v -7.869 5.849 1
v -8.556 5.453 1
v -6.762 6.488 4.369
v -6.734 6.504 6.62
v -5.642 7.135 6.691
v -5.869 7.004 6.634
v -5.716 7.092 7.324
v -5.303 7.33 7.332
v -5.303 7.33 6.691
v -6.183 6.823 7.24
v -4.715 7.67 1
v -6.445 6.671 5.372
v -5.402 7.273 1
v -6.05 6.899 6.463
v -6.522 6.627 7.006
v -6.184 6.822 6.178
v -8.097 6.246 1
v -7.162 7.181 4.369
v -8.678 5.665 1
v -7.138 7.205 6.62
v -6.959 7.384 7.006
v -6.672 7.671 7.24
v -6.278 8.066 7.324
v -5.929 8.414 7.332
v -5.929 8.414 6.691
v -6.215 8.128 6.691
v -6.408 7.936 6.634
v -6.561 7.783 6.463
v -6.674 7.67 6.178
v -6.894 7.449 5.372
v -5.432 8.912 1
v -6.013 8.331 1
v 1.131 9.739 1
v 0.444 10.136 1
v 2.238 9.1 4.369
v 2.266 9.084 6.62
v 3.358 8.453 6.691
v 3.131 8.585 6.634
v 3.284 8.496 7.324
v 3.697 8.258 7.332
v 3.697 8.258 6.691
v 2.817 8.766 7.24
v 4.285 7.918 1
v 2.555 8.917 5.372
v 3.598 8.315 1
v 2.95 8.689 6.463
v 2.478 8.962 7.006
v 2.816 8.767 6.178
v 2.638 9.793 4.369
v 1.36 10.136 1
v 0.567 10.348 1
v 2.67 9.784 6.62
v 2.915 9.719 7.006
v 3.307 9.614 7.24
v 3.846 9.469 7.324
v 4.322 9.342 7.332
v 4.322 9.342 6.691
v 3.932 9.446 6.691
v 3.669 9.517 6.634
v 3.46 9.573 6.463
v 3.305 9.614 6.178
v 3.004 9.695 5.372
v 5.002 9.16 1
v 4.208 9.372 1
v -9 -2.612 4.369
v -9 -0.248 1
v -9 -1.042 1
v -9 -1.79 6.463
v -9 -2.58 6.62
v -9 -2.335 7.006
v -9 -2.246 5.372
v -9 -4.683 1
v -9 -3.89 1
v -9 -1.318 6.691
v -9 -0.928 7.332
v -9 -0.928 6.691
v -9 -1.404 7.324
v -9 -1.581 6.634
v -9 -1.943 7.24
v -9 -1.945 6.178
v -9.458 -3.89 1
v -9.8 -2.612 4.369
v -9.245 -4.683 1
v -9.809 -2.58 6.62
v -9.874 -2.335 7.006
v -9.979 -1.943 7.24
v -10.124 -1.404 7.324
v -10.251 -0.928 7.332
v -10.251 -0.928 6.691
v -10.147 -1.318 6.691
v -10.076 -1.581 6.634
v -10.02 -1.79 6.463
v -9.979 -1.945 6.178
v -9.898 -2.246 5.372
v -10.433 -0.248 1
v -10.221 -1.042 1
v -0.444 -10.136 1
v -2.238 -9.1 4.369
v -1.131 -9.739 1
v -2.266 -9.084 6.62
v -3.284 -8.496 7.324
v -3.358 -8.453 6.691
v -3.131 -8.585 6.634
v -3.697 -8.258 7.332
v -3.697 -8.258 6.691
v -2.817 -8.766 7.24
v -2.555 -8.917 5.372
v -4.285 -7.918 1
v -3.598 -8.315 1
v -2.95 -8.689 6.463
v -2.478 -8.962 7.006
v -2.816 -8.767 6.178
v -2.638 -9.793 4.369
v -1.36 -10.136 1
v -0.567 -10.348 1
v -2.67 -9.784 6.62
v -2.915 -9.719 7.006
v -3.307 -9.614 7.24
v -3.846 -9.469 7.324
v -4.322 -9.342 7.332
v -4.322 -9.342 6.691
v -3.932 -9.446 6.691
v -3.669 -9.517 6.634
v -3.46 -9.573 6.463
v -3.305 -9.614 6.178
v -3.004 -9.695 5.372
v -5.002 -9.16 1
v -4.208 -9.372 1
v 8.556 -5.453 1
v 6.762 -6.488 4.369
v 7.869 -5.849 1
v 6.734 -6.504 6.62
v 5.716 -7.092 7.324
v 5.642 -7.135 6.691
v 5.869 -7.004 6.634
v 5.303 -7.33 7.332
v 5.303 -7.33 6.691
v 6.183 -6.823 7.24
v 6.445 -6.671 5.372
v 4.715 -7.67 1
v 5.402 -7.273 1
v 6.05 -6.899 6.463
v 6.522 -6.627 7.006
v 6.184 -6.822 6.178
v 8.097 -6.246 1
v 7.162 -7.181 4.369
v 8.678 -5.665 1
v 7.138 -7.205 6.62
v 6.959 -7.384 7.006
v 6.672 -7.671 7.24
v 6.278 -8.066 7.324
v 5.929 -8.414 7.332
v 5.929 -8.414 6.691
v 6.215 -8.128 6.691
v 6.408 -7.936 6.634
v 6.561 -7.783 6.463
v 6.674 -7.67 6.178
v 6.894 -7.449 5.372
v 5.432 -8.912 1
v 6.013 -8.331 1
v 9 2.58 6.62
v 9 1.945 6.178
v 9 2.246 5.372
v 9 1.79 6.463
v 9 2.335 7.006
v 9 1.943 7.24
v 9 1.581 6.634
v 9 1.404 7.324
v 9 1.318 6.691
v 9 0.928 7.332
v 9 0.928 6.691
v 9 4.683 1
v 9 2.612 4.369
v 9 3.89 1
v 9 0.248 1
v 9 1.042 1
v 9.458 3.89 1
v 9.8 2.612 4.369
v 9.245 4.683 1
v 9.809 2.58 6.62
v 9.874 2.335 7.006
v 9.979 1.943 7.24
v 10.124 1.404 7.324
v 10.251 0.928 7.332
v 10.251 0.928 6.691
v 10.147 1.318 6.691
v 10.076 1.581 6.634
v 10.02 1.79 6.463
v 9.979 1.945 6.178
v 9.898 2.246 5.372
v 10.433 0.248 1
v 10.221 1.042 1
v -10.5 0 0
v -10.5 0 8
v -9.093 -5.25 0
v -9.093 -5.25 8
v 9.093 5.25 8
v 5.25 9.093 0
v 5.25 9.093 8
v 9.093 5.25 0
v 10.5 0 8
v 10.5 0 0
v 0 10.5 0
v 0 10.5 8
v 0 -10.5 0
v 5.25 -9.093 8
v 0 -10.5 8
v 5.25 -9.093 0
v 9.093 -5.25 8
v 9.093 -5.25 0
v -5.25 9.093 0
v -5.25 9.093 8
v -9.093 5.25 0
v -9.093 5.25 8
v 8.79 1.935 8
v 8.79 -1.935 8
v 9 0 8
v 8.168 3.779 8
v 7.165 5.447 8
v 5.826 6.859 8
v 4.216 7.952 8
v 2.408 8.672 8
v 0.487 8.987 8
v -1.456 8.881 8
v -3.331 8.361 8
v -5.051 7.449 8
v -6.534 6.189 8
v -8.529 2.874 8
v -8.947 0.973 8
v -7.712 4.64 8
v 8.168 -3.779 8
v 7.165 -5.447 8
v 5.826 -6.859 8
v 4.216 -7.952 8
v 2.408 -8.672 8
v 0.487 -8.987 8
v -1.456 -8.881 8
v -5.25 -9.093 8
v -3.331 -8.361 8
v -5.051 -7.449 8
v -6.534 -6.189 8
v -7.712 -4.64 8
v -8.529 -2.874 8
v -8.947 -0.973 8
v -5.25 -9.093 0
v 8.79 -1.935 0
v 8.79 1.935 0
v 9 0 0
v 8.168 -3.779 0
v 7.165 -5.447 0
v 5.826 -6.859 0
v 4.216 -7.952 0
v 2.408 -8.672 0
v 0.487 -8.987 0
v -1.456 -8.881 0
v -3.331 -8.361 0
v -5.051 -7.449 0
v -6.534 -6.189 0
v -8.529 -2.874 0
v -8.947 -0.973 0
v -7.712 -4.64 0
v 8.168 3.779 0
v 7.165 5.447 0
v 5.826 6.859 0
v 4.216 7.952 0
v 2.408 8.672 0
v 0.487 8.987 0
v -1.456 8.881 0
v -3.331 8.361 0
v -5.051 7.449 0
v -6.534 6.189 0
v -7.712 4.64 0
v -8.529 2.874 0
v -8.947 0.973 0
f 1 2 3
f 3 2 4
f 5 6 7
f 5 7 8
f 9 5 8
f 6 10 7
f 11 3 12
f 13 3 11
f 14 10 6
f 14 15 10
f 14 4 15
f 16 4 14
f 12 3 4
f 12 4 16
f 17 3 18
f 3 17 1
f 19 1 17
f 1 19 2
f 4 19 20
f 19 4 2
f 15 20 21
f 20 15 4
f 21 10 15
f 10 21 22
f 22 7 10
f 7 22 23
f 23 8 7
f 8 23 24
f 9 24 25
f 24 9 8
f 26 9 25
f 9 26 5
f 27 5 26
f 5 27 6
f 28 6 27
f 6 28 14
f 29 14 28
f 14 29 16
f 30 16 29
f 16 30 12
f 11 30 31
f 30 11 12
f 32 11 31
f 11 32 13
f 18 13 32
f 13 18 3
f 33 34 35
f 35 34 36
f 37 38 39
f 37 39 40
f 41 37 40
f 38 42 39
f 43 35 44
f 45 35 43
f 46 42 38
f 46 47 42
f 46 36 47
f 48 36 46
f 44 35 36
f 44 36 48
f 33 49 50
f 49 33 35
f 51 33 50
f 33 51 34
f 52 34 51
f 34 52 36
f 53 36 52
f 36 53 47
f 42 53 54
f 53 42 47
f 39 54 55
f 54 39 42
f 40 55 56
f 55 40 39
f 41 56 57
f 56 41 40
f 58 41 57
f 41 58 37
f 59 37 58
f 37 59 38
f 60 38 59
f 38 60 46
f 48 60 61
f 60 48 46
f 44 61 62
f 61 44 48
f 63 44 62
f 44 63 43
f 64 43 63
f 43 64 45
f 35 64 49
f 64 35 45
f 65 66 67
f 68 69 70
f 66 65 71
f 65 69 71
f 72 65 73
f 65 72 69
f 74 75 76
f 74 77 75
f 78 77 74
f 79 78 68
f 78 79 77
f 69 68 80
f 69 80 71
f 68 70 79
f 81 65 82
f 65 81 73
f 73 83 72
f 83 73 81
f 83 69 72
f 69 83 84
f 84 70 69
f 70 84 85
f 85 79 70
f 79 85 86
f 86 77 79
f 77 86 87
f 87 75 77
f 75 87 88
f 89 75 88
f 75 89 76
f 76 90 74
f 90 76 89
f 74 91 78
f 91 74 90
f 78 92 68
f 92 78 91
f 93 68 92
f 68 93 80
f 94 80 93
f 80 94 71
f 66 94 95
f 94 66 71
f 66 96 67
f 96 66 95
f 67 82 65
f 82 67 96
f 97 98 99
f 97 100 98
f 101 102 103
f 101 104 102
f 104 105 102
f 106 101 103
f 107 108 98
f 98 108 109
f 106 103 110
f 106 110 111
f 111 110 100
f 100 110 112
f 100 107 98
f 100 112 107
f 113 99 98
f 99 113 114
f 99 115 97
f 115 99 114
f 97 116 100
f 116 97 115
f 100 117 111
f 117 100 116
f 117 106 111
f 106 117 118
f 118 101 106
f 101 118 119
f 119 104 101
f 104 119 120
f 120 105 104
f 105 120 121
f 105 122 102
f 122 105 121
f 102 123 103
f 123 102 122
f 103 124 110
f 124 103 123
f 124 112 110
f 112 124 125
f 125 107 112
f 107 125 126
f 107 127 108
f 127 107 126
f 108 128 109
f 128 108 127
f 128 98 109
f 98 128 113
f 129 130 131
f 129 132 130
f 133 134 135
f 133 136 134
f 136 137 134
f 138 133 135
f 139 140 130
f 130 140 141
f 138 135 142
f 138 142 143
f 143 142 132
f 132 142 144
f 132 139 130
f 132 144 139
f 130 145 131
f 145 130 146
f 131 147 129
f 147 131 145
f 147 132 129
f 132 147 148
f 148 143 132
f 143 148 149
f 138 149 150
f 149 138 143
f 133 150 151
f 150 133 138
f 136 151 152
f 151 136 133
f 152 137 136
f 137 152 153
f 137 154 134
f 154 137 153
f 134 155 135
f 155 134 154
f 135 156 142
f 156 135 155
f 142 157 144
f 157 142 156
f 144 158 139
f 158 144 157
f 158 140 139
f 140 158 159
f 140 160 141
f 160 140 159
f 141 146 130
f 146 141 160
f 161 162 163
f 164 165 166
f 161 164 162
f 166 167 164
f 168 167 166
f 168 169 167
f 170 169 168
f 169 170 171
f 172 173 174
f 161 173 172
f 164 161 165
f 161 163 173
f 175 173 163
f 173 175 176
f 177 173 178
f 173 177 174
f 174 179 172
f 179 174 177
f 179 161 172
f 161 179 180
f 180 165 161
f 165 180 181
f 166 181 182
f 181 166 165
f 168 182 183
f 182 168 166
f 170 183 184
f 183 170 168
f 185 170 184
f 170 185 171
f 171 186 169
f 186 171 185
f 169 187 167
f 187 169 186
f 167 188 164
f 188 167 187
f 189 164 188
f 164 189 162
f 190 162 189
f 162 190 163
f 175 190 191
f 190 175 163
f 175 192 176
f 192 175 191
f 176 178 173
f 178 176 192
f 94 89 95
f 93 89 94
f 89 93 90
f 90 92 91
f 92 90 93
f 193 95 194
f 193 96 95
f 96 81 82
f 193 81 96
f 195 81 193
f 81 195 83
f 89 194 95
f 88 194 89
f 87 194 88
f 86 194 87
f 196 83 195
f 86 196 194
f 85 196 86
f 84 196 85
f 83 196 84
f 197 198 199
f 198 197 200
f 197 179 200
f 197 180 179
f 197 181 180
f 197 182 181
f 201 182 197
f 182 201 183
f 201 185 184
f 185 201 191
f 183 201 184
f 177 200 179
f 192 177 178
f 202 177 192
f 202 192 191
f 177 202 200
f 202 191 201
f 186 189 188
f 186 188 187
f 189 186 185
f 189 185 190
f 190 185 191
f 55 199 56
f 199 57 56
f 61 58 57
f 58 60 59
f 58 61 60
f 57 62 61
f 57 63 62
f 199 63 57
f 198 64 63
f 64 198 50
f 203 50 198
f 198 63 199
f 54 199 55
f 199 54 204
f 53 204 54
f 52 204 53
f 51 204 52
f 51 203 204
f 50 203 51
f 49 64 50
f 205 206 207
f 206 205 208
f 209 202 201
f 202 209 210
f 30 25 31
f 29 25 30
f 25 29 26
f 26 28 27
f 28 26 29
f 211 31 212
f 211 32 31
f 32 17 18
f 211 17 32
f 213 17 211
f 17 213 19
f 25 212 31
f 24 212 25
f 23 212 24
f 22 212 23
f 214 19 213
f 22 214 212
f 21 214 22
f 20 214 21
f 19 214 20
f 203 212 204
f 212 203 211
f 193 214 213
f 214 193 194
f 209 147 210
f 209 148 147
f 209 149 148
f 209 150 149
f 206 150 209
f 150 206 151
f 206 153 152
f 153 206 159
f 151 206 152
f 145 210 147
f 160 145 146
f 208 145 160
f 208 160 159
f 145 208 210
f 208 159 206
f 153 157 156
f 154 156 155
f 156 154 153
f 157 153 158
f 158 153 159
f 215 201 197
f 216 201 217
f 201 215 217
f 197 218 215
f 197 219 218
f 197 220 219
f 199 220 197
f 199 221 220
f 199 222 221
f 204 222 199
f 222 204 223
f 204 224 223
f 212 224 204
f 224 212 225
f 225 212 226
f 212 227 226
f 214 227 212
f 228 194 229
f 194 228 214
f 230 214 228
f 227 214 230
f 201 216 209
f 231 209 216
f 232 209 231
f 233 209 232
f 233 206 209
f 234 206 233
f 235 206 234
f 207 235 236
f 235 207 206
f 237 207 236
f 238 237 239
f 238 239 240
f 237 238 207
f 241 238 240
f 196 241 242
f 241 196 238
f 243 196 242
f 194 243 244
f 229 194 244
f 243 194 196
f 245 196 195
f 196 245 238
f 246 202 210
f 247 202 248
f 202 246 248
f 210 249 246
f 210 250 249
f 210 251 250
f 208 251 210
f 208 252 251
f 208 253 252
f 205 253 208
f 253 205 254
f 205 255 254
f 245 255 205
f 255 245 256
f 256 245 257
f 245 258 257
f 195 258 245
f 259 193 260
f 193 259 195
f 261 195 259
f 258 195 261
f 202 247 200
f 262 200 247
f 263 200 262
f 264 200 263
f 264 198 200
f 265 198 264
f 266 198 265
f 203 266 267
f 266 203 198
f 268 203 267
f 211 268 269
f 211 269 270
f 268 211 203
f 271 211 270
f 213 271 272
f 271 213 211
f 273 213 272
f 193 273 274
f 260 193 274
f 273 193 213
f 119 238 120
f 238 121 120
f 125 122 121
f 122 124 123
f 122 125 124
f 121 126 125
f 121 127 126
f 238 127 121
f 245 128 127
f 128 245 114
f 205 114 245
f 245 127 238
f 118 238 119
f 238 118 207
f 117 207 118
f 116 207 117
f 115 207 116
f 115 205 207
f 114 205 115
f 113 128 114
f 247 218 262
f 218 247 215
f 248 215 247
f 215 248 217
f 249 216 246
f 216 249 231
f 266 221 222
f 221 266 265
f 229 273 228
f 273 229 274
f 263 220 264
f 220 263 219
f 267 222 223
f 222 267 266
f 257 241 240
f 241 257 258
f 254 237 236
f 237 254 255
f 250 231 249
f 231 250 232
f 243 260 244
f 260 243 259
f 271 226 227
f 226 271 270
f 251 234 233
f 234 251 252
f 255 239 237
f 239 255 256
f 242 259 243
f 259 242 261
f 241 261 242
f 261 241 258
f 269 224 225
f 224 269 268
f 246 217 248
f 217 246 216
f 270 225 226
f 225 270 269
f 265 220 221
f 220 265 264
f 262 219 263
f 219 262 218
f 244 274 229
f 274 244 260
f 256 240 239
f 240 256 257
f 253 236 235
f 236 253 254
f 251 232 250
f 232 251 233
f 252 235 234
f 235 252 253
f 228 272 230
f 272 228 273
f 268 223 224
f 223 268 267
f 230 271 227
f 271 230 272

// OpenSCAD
$fa = 1;

/* 
 * Adjust these values!
 * Especially the inner diameter. Make it more than you think it should be,
 * then make it bigger than that. I'm still wearing my lambda ring. Because it
 * is stuck. But I only wish I had filed it down before trying it on... :-)
*/ 

inner     = 18; // inner diameter
thickness =  3; // ring wall thickness
width     =  8; // ring wall tallness

module do_lambda(x_offset, thickness,
                 angle_increment, lambda){
    rotate([90, 0, angle_increment * lambda])
        translate([x_offset, thickness/3, 0])
        rotate([0,90,0])
        linear_extrude(height=thickness)
                text(font="Source Code Pro",
                     size=6,
                     "λ");
    if(lambda > 1){
        do_lambda(x_offset, thickness,
                  angle_increment, lambda - 1);
    }
}

difference(){
    cylinder(8,
             d1=inner+thickness,
             d2=inner+thickness,
             $fa = 360/12);
    cylinder(8, d1=inner, d2=inner);
    do_lambda(inner/2, thickness, 360/6, 6);
}
